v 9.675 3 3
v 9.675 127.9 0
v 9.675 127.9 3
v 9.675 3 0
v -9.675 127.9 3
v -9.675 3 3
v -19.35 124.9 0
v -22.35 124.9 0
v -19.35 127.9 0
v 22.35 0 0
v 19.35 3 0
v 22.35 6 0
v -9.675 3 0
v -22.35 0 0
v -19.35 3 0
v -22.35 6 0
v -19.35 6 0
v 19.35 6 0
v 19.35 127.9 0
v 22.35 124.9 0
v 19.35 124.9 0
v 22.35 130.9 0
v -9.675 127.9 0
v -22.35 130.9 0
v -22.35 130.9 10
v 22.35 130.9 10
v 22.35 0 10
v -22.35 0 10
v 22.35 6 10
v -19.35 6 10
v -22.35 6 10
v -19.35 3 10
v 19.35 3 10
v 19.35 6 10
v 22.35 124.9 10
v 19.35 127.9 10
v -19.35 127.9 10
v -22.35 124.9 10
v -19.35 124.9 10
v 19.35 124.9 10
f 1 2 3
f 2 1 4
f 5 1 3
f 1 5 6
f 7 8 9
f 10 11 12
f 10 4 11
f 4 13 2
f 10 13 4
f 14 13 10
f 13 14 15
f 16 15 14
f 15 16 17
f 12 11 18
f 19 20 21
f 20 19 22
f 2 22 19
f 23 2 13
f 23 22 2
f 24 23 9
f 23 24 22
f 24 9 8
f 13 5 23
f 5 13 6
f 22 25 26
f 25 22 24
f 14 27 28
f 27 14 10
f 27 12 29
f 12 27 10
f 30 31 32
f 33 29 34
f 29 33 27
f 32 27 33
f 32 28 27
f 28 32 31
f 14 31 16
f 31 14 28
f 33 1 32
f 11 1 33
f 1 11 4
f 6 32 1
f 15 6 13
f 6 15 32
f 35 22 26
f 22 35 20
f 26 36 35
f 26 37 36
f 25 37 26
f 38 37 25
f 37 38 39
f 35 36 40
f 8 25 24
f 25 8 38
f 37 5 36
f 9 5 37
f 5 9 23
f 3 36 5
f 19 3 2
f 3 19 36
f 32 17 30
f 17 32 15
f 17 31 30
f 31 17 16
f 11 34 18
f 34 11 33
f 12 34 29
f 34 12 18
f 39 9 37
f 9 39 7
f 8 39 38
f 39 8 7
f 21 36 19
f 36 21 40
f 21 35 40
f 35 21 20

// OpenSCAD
block_h = 124.4 + 0.5;
block_w = 38.2 + 0.5;
block_t = 7;

wall_w = 3;

column_w_s = 0.5;

translate( [ -( block_w * column_w_s ) / 2, 0, 0 ] )
    cube( [ block_w * column_w_s, block_h + 2 * wall_w, wall_w ] );
translate( [ -( block_w + 2 * wall_w ) / 2, 0, 0 ] )
    cube( [ block_w + 2 * wall_w, wall_w, block_t + wall_w ] );
translate( [ -( block_w + 2 * wall_w ) / 2, block_h + wall_w, 0 ] )
    cube( [ block_w + 2 * wall_w, wall_w, block_t + wall_w ] );
 
translate( [ -( block_w + 2 * wall_w ) / 2, 0, 0 ] ) 
    cube( [ wall_w, 2 * wall_w, block_t + wall_w ] );
translate( [ block_w / 2, 0, 0 ] ) 
    cube( [ wall_w, 2 * wall_w, block_t + wall_w ] );
    
translate( [ -( block_w + 2 * wall_w ) / 2, block_h, 0 ] ) 
    cube( [ wall_w, 2 * wall_w, block_t + wall_w ] );
translate( [ block_w / 2, block_h, 0 ] ) 
    cube( [ wall_w, 2 * wall_w, block_t + wall_w ] );
